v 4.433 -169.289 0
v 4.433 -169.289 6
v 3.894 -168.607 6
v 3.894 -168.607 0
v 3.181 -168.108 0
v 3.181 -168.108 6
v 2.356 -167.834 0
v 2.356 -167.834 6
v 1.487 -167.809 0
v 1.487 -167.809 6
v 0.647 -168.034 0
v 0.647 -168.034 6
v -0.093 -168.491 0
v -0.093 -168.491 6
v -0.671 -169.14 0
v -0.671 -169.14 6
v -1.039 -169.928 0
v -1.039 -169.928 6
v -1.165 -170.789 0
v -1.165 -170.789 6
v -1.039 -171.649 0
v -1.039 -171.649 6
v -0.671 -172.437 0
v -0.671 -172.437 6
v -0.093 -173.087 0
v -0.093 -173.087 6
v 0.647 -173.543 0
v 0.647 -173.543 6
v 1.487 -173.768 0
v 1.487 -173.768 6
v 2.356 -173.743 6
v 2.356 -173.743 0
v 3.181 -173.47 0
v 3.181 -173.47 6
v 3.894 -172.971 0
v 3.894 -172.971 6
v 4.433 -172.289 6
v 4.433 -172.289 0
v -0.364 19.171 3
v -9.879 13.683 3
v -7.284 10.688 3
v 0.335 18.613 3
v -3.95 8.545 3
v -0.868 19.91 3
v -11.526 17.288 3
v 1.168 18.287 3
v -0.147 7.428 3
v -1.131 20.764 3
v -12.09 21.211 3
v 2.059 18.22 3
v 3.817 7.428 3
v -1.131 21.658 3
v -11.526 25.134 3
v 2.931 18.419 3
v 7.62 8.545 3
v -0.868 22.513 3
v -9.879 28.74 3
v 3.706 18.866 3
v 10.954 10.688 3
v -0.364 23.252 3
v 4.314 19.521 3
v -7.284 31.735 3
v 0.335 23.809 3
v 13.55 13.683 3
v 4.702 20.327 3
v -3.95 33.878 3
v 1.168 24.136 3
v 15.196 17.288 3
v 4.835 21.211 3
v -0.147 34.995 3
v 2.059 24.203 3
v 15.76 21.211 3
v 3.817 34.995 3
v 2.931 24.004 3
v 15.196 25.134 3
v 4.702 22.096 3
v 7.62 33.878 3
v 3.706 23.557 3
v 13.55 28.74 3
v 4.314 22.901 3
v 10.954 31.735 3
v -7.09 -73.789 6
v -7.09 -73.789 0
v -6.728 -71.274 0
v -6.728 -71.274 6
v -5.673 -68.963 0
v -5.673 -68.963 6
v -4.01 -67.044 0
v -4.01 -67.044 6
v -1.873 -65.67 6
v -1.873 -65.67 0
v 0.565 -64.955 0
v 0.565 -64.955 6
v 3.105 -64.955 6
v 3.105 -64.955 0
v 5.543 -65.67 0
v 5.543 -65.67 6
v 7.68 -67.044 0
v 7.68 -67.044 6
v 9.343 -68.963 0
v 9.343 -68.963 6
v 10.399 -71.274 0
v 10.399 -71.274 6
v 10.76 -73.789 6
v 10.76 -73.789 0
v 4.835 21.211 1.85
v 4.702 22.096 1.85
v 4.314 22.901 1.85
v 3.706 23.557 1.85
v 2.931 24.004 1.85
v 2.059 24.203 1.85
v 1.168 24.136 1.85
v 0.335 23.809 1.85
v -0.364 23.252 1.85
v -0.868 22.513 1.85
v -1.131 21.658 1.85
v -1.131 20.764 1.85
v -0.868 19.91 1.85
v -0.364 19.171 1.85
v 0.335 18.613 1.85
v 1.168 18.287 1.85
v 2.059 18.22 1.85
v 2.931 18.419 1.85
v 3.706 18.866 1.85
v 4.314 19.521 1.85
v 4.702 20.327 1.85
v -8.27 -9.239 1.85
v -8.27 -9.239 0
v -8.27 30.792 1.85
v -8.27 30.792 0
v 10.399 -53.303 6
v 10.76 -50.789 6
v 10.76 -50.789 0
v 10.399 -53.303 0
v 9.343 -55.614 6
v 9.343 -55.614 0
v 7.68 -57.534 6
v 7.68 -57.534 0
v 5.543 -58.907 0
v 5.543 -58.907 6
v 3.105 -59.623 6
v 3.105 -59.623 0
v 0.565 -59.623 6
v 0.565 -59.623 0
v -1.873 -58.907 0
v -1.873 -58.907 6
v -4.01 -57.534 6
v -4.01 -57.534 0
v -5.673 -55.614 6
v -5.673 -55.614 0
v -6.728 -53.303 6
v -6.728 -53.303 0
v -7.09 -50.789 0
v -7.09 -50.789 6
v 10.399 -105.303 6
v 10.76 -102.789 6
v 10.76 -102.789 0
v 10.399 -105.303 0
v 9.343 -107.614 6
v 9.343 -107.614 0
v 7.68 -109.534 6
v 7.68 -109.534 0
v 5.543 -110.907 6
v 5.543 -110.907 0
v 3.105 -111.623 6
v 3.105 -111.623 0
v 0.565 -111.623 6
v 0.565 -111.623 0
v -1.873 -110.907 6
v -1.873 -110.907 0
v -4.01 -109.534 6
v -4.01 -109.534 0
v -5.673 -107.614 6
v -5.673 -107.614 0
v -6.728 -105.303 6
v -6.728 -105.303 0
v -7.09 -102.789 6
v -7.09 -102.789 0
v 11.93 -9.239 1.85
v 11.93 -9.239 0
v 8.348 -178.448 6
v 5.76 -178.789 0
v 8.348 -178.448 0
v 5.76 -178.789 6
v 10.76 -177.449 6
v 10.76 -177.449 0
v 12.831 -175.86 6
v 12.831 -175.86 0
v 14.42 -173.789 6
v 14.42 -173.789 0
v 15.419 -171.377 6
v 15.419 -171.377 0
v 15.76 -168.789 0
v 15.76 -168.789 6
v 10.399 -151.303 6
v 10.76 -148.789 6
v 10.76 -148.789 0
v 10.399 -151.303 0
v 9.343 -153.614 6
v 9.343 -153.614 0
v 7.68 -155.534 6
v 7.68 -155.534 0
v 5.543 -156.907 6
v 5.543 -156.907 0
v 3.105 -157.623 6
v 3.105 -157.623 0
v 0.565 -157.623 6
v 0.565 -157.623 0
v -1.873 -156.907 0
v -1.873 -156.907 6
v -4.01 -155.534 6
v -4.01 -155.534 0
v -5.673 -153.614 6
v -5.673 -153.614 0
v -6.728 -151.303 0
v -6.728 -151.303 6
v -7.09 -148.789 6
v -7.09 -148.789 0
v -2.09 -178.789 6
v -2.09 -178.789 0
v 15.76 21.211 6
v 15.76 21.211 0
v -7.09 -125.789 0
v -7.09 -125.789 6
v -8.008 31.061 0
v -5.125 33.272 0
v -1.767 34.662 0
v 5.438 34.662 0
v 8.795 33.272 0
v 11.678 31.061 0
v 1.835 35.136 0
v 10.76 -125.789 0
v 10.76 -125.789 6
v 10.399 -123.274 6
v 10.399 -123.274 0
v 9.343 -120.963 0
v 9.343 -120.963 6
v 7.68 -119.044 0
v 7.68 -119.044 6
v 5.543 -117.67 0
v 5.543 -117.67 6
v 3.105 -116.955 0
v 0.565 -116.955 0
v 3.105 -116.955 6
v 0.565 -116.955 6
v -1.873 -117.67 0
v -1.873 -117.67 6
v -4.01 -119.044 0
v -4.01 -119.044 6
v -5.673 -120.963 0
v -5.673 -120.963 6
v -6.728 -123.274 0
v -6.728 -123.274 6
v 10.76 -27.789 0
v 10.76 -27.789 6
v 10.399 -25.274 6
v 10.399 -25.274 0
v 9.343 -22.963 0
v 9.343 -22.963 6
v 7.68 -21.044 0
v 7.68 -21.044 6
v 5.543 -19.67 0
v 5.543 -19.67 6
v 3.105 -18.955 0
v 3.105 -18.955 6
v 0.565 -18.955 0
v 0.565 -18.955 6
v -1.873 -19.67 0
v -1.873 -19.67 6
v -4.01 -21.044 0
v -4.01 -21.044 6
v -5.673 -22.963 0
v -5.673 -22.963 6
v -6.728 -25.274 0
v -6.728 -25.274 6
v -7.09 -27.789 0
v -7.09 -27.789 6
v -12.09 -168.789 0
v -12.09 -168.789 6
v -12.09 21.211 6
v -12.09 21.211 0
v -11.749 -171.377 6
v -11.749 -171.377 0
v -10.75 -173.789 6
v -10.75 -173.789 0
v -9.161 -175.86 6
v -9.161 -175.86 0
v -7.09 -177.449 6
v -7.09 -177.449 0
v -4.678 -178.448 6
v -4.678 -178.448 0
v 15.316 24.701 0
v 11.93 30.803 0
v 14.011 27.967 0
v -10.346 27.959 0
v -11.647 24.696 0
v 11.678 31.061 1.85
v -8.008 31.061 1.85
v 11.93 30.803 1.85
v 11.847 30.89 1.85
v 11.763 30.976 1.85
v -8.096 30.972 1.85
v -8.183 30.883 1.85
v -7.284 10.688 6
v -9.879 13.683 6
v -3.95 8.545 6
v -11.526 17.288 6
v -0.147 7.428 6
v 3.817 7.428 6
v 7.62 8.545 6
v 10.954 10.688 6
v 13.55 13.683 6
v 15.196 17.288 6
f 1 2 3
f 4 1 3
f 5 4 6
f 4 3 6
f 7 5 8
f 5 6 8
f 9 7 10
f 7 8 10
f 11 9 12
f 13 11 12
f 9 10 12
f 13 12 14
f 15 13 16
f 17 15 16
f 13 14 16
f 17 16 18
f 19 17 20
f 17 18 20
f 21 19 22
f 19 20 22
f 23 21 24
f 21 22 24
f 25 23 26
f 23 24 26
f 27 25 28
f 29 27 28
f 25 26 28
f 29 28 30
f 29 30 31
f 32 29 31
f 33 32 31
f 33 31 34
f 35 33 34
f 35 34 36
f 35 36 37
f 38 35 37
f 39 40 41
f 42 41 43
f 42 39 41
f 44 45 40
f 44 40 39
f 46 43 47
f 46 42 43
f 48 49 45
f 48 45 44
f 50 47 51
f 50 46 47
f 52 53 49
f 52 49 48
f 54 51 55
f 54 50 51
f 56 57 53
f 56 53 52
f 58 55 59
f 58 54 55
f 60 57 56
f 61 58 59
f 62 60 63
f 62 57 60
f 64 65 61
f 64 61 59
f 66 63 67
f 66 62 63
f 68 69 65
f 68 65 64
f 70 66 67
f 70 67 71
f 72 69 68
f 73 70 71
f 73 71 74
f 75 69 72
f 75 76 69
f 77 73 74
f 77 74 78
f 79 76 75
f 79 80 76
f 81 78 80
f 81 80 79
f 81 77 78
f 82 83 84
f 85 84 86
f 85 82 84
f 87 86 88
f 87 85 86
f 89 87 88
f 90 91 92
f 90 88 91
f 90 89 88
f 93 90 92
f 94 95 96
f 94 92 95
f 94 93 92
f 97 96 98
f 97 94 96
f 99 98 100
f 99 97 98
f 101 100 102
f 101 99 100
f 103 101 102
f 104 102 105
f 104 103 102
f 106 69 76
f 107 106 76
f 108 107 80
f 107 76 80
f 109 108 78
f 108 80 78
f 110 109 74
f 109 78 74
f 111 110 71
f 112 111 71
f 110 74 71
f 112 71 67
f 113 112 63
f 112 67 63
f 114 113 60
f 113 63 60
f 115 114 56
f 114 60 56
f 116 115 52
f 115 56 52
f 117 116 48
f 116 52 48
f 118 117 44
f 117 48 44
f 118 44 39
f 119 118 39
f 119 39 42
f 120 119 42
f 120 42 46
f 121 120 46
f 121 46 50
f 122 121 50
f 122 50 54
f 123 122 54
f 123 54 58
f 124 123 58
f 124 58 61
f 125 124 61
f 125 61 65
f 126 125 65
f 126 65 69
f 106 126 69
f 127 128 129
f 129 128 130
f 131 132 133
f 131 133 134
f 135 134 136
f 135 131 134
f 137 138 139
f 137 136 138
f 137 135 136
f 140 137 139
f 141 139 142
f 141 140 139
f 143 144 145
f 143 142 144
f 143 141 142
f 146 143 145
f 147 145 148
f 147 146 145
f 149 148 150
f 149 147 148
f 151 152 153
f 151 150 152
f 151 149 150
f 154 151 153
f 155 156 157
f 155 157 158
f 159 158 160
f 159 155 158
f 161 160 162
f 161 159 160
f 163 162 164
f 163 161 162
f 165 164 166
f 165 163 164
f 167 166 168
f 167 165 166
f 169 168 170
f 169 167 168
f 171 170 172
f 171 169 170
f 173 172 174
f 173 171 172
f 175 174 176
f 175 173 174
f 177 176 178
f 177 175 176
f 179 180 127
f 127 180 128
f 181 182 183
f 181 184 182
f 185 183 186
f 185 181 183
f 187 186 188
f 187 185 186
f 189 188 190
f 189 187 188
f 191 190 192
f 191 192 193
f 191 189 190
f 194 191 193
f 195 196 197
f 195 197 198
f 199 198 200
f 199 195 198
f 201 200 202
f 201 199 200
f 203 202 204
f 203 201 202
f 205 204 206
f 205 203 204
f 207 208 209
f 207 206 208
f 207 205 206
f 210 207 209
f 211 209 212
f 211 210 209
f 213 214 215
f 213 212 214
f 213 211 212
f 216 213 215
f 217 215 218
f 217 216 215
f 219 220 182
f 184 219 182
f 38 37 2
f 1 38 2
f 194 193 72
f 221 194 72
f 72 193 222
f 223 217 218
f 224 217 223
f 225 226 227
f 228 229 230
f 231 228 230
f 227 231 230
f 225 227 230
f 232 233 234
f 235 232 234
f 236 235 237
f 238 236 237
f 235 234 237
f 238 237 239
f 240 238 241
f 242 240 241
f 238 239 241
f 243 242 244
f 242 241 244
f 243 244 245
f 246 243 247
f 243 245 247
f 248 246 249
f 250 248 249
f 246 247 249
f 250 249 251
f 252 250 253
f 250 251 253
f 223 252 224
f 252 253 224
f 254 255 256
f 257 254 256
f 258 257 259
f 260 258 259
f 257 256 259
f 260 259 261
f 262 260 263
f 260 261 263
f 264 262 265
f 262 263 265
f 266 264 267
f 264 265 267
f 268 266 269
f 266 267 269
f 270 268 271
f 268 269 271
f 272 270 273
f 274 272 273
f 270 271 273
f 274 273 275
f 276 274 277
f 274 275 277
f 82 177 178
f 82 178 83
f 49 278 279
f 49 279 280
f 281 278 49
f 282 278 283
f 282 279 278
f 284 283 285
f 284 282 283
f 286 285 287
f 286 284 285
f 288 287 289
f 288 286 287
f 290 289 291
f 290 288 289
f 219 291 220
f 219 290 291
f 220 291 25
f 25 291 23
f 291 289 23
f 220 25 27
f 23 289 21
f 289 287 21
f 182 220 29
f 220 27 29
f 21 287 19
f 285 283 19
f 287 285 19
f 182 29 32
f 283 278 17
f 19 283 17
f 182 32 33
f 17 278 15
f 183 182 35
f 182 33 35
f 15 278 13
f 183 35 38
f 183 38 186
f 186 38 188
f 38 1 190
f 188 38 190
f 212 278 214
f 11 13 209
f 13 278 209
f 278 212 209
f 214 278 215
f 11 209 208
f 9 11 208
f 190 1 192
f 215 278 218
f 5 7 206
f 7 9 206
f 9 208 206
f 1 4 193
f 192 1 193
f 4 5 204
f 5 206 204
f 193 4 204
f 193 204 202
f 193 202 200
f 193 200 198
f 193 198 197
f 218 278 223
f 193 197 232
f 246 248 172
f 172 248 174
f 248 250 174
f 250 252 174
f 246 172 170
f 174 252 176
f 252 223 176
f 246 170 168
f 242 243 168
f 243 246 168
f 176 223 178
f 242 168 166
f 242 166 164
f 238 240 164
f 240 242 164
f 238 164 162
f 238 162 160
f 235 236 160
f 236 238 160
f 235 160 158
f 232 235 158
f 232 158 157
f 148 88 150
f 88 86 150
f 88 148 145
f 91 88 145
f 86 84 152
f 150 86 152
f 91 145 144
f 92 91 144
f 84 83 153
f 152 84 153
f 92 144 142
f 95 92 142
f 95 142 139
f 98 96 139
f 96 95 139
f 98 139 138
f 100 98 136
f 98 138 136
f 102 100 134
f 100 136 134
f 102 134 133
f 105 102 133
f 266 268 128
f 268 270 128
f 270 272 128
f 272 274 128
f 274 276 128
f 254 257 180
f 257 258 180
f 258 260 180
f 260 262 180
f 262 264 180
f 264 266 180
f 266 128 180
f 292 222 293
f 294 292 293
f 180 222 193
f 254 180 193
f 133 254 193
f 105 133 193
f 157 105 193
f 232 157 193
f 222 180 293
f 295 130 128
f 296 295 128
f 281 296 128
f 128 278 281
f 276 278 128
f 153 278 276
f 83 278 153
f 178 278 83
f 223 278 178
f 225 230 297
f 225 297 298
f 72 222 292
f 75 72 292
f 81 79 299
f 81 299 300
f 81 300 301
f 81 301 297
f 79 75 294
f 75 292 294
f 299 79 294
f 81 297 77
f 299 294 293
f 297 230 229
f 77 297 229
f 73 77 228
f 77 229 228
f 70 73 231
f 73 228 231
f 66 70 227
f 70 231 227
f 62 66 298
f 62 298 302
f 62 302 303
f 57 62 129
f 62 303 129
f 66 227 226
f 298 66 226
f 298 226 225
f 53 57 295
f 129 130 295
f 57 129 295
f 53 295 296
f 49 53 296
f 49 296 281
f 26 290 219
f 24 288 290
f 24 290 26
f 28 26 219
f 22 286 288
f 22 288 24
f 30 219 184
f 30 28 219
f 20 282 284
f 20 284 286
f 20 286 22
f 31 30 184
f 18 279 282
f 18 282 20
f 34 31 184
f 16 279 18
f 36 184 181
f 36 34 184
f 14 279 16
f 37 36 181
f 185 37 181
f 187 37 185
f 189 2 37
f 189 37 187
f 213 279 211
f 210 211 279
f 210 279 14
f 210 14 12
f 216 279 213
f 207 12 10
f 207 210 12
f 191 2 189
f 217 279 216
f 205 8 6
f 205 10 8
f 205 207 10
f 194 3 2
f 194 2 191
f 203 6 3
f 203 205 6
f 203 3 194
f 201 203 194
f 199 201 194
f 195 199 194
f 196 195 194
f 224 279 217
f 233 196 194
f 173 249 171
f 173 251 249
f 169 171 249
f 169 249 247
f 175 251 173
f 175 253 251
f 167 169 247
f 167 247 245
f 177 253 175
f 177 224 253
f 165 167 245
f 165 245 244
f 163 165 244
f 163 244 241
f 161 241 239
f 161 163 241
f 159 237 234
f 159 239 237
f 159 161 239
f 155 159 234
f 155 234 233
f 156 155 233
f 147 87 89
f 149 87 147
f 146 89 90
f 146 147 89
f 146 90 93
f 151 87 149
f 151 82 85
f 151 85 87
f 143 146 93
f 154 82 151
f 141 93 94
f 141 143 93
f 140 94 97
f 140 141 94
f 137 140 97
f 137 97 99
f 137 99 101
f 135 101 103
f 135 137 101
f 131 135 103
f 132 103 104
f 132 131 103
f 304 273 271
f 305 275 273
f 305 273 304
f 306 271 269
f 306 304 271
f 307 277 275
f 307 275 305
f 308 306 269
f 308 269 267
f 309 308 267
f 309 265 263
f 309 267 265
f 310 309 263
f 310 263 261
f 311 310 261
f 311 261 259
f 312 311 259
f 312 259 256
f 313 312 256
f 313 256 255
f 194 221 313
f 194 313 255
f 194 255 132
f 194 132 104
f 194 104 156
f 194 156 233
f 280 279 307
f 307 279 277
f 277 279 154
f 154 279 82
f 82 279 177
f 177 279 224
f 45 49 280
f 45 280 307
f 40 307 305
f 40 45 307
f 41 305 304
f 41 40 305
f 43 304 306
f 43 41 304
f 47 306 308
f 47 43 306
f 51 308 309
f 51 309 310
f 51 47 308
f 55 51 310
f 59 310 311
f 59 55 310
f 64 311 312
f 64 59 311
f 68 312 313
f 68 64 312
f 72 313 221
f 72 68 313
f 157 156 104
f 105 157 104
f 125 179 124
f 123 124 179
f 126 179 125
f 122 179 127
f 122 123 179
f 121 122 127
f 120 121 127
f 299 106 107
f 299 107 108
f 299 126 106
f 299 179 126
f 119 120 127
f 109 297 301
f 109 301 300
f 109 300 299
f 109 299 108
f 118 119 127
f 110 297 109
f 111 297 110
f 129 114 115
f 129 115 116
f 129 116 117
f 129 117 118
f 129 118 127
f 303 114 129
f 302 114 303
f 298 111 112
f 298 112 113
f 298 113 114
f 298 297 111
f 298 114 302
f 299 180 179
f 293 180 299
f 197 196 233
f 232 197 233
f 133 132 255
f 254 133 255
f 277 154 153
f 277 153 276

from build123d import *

# Parameters (mm, degrees)
ESQUISSE1_W             = 27.85
ESQUISSE1_H             = 200
BOSS_EXTRU_2_DEPTH      = 6
ENL_V_MAT_EXTRU_1_DEPTH = 6
ENL_V_START             = -3
ESQUISSE4_R             = 13.925
ENL_V_MAT_EXTRU_2_DEPTH = 3
ESQUISSE5_R             = 3
ENL_V_MAT_EXTRU_3_DEPTH = 3
ESQUISSE6_W             = 17.85
ESQUISSE6_H             = 23
ESQUISSE6_H_2           = 29
ENL_V_MAT_EXTRU_4_DEPTH = 10
CONG_1_R                = 10
CONG_2_R                = 10
ESQUISSE9_W             = 20.2
ESQUISSE9_H             = 40.3
ENL_V_MAT_EXTRU_7_DEPTH = 1.85


with BuildPart() as part:
    # Esquisse1 → Boss.-Extru.2 (new body)
    with BuildSketch(Plane.XY):
        with Locations((1.835077519, -78.788662791)):
            Rectangle(ESQUISSE1_W, ESQUISSE1_H)
        with BuildLine():
            Line((-12.089922481, 21.211337209), (15.760077519, 21.211337209))
            ThreePointArc((15.760077519, 21.211337209), (1.835077519, 35.136337209), (-12.089922481, 21.211337209))
        make_face()
    extrude(amount=BOSS_EXTRU_2_DEPTH)

    # Esquisse3 → Enlèv. mat.-Extru.1 (cut)
    with BuildSketch(Plane.XY.offset(6)):
        with BuildLine():
            Line((4.433153731, -172.288662791), (4.433153731, -169.288662791))
            ThreePointArc((4.433153731, -169.288662791), (-1.164922481, -170.788662791), (4.433153731, -172.288662791))
        make_face()
    extrude(amount=-ENL_V_MAT_EXTRU_1_DEPTH, mode=Mode.SUBTRACT)

    # Esquisse4 → Enlèv. mat.-Extru.2 (cut)
    with BuildSketch(Plane.XY.offset(6).offset(ENL_V_START)):
        with Locations((1.835077519, 21.211337209)):
            Circle(ESQUISSE4_R)
    extrude(amount=ENL_V_MAT_EXTRU_2_DEPTH, mode=Mode.SUBTRACT)

    # Esquisse5 → Enlèv. mat.-Extru.3 (cut)
    with BuildSketch(Plane.XY.offset(3)):
        with Locations((1.835077519, 21.211337209)):
            Circle(ESQUISSE5_R)
    extrude(amount=-ENL_V_MAT_EXTRU_3_DEPTH, mode=Mode.SUBTRACT)

    # Esquisse6 → Enlèv. mat.-Extru.4 (cut)
    with BuildSketch(Plane.XY.offset(6)):
        with BuildLine():
            Line((-7.089922481, -27.788662791), (10.760077519, -27.788662791))
            ThreePointArc((10.760077519, -27.788662791), (1.835077519, -18.863662791), (-7.089922481, -27.788662791))
        make_face()
        with Locations((1.835077519, -39.288662791)):
            Rectangle(ESQUISSE6_W, ESQUISSE6_H)
        with BuildLine():
            Line((-7.089922481, -50.788662791), (10.760077519, -50.788662791))
            ThreePointArc((10.760077519, -50.788662791), (1.835077519, -59.713662791), (-7.089922481, -50.788662791))
        make_face()
        with BuildLine():
            ThreePointArc((-7.089922481, -73.788662791), (1.835077519, -64.863662791), (10.760077519, -73.788662791))
            Line((10.760077519, -73.788662791), (-7.089922481, -73.788662791))
        make_face()
        with Locations((1.835077519, -88.288662791)):
            Rectangle(ESQUISSE6_W, ESQUISSE6_H_2)
        with BuildLine():
            Line((-7.089922481, -102.788662791), (10.760077519, -102.788662791))
            ThreePointArc((10.760077519, -102.788662791), (1.835077519, -111.713662791), (-7.089922481, -102.788662791))
        make_face()
        with BuildLine():
            Line((-7.089922481, -125.788662791), (10.760077519, -125.788662791))
            ThreePointArc((10.760077519, -125.788662791), (1.835077519, -116.863662791), (-7.089922481, -125.788662791))
        make_face()
        with Locations((1.835077519, -137.288662791)):
            Rectangle(ESQUISSE6_W, ESQUISSE6_H)
        with BuildLine():
            Line((-7.089922481, -148.788662791), (10.760077519, -148.788662791))
            ThreePointArc((10.760077519, -148.788662791), (1.835077519, -157.713662791), (-7.089922481, -148.788662791))
        make_face()
    extrude(amount=-ENL_V_MAT_EXTRU_4_DEPTH, mode=Mode.SUBTRACT)

    # Congé1
    cong_1_edges = [part.edges().sort_by_distance(p)[0] for p in [
        (-12.089922481, -178.788662791, 3),
    ]]
    fillet(cong_1_edges, radius=CONG_1_R)

    # Congé2
    cong_2_edges = [part.edges().sort_by_distance(p)[0] for p in [
        (15.760077519, -178.788662791, 3),
    ]]
    fillet(cong_2_edges, radius=CONG_2_R)

    # Esquisse9 → Enlèv. mat.-Extru.7 (cut)
    with BuildSketch(Plane(origin=(0, 0, 0), x_dir=(-1, 0, 0), z_dir=(0, 0, -1))):
        with Locations((-1.830077519, 10.911337209)):
            Rectangle(ESQUISSE9_W, ESQUISSE9_H)
    extrude(amount=-ENL_V_MAT_EXTRU_7_DEPTH, mode=Mode.SUBTRACT)


solid = part.part
